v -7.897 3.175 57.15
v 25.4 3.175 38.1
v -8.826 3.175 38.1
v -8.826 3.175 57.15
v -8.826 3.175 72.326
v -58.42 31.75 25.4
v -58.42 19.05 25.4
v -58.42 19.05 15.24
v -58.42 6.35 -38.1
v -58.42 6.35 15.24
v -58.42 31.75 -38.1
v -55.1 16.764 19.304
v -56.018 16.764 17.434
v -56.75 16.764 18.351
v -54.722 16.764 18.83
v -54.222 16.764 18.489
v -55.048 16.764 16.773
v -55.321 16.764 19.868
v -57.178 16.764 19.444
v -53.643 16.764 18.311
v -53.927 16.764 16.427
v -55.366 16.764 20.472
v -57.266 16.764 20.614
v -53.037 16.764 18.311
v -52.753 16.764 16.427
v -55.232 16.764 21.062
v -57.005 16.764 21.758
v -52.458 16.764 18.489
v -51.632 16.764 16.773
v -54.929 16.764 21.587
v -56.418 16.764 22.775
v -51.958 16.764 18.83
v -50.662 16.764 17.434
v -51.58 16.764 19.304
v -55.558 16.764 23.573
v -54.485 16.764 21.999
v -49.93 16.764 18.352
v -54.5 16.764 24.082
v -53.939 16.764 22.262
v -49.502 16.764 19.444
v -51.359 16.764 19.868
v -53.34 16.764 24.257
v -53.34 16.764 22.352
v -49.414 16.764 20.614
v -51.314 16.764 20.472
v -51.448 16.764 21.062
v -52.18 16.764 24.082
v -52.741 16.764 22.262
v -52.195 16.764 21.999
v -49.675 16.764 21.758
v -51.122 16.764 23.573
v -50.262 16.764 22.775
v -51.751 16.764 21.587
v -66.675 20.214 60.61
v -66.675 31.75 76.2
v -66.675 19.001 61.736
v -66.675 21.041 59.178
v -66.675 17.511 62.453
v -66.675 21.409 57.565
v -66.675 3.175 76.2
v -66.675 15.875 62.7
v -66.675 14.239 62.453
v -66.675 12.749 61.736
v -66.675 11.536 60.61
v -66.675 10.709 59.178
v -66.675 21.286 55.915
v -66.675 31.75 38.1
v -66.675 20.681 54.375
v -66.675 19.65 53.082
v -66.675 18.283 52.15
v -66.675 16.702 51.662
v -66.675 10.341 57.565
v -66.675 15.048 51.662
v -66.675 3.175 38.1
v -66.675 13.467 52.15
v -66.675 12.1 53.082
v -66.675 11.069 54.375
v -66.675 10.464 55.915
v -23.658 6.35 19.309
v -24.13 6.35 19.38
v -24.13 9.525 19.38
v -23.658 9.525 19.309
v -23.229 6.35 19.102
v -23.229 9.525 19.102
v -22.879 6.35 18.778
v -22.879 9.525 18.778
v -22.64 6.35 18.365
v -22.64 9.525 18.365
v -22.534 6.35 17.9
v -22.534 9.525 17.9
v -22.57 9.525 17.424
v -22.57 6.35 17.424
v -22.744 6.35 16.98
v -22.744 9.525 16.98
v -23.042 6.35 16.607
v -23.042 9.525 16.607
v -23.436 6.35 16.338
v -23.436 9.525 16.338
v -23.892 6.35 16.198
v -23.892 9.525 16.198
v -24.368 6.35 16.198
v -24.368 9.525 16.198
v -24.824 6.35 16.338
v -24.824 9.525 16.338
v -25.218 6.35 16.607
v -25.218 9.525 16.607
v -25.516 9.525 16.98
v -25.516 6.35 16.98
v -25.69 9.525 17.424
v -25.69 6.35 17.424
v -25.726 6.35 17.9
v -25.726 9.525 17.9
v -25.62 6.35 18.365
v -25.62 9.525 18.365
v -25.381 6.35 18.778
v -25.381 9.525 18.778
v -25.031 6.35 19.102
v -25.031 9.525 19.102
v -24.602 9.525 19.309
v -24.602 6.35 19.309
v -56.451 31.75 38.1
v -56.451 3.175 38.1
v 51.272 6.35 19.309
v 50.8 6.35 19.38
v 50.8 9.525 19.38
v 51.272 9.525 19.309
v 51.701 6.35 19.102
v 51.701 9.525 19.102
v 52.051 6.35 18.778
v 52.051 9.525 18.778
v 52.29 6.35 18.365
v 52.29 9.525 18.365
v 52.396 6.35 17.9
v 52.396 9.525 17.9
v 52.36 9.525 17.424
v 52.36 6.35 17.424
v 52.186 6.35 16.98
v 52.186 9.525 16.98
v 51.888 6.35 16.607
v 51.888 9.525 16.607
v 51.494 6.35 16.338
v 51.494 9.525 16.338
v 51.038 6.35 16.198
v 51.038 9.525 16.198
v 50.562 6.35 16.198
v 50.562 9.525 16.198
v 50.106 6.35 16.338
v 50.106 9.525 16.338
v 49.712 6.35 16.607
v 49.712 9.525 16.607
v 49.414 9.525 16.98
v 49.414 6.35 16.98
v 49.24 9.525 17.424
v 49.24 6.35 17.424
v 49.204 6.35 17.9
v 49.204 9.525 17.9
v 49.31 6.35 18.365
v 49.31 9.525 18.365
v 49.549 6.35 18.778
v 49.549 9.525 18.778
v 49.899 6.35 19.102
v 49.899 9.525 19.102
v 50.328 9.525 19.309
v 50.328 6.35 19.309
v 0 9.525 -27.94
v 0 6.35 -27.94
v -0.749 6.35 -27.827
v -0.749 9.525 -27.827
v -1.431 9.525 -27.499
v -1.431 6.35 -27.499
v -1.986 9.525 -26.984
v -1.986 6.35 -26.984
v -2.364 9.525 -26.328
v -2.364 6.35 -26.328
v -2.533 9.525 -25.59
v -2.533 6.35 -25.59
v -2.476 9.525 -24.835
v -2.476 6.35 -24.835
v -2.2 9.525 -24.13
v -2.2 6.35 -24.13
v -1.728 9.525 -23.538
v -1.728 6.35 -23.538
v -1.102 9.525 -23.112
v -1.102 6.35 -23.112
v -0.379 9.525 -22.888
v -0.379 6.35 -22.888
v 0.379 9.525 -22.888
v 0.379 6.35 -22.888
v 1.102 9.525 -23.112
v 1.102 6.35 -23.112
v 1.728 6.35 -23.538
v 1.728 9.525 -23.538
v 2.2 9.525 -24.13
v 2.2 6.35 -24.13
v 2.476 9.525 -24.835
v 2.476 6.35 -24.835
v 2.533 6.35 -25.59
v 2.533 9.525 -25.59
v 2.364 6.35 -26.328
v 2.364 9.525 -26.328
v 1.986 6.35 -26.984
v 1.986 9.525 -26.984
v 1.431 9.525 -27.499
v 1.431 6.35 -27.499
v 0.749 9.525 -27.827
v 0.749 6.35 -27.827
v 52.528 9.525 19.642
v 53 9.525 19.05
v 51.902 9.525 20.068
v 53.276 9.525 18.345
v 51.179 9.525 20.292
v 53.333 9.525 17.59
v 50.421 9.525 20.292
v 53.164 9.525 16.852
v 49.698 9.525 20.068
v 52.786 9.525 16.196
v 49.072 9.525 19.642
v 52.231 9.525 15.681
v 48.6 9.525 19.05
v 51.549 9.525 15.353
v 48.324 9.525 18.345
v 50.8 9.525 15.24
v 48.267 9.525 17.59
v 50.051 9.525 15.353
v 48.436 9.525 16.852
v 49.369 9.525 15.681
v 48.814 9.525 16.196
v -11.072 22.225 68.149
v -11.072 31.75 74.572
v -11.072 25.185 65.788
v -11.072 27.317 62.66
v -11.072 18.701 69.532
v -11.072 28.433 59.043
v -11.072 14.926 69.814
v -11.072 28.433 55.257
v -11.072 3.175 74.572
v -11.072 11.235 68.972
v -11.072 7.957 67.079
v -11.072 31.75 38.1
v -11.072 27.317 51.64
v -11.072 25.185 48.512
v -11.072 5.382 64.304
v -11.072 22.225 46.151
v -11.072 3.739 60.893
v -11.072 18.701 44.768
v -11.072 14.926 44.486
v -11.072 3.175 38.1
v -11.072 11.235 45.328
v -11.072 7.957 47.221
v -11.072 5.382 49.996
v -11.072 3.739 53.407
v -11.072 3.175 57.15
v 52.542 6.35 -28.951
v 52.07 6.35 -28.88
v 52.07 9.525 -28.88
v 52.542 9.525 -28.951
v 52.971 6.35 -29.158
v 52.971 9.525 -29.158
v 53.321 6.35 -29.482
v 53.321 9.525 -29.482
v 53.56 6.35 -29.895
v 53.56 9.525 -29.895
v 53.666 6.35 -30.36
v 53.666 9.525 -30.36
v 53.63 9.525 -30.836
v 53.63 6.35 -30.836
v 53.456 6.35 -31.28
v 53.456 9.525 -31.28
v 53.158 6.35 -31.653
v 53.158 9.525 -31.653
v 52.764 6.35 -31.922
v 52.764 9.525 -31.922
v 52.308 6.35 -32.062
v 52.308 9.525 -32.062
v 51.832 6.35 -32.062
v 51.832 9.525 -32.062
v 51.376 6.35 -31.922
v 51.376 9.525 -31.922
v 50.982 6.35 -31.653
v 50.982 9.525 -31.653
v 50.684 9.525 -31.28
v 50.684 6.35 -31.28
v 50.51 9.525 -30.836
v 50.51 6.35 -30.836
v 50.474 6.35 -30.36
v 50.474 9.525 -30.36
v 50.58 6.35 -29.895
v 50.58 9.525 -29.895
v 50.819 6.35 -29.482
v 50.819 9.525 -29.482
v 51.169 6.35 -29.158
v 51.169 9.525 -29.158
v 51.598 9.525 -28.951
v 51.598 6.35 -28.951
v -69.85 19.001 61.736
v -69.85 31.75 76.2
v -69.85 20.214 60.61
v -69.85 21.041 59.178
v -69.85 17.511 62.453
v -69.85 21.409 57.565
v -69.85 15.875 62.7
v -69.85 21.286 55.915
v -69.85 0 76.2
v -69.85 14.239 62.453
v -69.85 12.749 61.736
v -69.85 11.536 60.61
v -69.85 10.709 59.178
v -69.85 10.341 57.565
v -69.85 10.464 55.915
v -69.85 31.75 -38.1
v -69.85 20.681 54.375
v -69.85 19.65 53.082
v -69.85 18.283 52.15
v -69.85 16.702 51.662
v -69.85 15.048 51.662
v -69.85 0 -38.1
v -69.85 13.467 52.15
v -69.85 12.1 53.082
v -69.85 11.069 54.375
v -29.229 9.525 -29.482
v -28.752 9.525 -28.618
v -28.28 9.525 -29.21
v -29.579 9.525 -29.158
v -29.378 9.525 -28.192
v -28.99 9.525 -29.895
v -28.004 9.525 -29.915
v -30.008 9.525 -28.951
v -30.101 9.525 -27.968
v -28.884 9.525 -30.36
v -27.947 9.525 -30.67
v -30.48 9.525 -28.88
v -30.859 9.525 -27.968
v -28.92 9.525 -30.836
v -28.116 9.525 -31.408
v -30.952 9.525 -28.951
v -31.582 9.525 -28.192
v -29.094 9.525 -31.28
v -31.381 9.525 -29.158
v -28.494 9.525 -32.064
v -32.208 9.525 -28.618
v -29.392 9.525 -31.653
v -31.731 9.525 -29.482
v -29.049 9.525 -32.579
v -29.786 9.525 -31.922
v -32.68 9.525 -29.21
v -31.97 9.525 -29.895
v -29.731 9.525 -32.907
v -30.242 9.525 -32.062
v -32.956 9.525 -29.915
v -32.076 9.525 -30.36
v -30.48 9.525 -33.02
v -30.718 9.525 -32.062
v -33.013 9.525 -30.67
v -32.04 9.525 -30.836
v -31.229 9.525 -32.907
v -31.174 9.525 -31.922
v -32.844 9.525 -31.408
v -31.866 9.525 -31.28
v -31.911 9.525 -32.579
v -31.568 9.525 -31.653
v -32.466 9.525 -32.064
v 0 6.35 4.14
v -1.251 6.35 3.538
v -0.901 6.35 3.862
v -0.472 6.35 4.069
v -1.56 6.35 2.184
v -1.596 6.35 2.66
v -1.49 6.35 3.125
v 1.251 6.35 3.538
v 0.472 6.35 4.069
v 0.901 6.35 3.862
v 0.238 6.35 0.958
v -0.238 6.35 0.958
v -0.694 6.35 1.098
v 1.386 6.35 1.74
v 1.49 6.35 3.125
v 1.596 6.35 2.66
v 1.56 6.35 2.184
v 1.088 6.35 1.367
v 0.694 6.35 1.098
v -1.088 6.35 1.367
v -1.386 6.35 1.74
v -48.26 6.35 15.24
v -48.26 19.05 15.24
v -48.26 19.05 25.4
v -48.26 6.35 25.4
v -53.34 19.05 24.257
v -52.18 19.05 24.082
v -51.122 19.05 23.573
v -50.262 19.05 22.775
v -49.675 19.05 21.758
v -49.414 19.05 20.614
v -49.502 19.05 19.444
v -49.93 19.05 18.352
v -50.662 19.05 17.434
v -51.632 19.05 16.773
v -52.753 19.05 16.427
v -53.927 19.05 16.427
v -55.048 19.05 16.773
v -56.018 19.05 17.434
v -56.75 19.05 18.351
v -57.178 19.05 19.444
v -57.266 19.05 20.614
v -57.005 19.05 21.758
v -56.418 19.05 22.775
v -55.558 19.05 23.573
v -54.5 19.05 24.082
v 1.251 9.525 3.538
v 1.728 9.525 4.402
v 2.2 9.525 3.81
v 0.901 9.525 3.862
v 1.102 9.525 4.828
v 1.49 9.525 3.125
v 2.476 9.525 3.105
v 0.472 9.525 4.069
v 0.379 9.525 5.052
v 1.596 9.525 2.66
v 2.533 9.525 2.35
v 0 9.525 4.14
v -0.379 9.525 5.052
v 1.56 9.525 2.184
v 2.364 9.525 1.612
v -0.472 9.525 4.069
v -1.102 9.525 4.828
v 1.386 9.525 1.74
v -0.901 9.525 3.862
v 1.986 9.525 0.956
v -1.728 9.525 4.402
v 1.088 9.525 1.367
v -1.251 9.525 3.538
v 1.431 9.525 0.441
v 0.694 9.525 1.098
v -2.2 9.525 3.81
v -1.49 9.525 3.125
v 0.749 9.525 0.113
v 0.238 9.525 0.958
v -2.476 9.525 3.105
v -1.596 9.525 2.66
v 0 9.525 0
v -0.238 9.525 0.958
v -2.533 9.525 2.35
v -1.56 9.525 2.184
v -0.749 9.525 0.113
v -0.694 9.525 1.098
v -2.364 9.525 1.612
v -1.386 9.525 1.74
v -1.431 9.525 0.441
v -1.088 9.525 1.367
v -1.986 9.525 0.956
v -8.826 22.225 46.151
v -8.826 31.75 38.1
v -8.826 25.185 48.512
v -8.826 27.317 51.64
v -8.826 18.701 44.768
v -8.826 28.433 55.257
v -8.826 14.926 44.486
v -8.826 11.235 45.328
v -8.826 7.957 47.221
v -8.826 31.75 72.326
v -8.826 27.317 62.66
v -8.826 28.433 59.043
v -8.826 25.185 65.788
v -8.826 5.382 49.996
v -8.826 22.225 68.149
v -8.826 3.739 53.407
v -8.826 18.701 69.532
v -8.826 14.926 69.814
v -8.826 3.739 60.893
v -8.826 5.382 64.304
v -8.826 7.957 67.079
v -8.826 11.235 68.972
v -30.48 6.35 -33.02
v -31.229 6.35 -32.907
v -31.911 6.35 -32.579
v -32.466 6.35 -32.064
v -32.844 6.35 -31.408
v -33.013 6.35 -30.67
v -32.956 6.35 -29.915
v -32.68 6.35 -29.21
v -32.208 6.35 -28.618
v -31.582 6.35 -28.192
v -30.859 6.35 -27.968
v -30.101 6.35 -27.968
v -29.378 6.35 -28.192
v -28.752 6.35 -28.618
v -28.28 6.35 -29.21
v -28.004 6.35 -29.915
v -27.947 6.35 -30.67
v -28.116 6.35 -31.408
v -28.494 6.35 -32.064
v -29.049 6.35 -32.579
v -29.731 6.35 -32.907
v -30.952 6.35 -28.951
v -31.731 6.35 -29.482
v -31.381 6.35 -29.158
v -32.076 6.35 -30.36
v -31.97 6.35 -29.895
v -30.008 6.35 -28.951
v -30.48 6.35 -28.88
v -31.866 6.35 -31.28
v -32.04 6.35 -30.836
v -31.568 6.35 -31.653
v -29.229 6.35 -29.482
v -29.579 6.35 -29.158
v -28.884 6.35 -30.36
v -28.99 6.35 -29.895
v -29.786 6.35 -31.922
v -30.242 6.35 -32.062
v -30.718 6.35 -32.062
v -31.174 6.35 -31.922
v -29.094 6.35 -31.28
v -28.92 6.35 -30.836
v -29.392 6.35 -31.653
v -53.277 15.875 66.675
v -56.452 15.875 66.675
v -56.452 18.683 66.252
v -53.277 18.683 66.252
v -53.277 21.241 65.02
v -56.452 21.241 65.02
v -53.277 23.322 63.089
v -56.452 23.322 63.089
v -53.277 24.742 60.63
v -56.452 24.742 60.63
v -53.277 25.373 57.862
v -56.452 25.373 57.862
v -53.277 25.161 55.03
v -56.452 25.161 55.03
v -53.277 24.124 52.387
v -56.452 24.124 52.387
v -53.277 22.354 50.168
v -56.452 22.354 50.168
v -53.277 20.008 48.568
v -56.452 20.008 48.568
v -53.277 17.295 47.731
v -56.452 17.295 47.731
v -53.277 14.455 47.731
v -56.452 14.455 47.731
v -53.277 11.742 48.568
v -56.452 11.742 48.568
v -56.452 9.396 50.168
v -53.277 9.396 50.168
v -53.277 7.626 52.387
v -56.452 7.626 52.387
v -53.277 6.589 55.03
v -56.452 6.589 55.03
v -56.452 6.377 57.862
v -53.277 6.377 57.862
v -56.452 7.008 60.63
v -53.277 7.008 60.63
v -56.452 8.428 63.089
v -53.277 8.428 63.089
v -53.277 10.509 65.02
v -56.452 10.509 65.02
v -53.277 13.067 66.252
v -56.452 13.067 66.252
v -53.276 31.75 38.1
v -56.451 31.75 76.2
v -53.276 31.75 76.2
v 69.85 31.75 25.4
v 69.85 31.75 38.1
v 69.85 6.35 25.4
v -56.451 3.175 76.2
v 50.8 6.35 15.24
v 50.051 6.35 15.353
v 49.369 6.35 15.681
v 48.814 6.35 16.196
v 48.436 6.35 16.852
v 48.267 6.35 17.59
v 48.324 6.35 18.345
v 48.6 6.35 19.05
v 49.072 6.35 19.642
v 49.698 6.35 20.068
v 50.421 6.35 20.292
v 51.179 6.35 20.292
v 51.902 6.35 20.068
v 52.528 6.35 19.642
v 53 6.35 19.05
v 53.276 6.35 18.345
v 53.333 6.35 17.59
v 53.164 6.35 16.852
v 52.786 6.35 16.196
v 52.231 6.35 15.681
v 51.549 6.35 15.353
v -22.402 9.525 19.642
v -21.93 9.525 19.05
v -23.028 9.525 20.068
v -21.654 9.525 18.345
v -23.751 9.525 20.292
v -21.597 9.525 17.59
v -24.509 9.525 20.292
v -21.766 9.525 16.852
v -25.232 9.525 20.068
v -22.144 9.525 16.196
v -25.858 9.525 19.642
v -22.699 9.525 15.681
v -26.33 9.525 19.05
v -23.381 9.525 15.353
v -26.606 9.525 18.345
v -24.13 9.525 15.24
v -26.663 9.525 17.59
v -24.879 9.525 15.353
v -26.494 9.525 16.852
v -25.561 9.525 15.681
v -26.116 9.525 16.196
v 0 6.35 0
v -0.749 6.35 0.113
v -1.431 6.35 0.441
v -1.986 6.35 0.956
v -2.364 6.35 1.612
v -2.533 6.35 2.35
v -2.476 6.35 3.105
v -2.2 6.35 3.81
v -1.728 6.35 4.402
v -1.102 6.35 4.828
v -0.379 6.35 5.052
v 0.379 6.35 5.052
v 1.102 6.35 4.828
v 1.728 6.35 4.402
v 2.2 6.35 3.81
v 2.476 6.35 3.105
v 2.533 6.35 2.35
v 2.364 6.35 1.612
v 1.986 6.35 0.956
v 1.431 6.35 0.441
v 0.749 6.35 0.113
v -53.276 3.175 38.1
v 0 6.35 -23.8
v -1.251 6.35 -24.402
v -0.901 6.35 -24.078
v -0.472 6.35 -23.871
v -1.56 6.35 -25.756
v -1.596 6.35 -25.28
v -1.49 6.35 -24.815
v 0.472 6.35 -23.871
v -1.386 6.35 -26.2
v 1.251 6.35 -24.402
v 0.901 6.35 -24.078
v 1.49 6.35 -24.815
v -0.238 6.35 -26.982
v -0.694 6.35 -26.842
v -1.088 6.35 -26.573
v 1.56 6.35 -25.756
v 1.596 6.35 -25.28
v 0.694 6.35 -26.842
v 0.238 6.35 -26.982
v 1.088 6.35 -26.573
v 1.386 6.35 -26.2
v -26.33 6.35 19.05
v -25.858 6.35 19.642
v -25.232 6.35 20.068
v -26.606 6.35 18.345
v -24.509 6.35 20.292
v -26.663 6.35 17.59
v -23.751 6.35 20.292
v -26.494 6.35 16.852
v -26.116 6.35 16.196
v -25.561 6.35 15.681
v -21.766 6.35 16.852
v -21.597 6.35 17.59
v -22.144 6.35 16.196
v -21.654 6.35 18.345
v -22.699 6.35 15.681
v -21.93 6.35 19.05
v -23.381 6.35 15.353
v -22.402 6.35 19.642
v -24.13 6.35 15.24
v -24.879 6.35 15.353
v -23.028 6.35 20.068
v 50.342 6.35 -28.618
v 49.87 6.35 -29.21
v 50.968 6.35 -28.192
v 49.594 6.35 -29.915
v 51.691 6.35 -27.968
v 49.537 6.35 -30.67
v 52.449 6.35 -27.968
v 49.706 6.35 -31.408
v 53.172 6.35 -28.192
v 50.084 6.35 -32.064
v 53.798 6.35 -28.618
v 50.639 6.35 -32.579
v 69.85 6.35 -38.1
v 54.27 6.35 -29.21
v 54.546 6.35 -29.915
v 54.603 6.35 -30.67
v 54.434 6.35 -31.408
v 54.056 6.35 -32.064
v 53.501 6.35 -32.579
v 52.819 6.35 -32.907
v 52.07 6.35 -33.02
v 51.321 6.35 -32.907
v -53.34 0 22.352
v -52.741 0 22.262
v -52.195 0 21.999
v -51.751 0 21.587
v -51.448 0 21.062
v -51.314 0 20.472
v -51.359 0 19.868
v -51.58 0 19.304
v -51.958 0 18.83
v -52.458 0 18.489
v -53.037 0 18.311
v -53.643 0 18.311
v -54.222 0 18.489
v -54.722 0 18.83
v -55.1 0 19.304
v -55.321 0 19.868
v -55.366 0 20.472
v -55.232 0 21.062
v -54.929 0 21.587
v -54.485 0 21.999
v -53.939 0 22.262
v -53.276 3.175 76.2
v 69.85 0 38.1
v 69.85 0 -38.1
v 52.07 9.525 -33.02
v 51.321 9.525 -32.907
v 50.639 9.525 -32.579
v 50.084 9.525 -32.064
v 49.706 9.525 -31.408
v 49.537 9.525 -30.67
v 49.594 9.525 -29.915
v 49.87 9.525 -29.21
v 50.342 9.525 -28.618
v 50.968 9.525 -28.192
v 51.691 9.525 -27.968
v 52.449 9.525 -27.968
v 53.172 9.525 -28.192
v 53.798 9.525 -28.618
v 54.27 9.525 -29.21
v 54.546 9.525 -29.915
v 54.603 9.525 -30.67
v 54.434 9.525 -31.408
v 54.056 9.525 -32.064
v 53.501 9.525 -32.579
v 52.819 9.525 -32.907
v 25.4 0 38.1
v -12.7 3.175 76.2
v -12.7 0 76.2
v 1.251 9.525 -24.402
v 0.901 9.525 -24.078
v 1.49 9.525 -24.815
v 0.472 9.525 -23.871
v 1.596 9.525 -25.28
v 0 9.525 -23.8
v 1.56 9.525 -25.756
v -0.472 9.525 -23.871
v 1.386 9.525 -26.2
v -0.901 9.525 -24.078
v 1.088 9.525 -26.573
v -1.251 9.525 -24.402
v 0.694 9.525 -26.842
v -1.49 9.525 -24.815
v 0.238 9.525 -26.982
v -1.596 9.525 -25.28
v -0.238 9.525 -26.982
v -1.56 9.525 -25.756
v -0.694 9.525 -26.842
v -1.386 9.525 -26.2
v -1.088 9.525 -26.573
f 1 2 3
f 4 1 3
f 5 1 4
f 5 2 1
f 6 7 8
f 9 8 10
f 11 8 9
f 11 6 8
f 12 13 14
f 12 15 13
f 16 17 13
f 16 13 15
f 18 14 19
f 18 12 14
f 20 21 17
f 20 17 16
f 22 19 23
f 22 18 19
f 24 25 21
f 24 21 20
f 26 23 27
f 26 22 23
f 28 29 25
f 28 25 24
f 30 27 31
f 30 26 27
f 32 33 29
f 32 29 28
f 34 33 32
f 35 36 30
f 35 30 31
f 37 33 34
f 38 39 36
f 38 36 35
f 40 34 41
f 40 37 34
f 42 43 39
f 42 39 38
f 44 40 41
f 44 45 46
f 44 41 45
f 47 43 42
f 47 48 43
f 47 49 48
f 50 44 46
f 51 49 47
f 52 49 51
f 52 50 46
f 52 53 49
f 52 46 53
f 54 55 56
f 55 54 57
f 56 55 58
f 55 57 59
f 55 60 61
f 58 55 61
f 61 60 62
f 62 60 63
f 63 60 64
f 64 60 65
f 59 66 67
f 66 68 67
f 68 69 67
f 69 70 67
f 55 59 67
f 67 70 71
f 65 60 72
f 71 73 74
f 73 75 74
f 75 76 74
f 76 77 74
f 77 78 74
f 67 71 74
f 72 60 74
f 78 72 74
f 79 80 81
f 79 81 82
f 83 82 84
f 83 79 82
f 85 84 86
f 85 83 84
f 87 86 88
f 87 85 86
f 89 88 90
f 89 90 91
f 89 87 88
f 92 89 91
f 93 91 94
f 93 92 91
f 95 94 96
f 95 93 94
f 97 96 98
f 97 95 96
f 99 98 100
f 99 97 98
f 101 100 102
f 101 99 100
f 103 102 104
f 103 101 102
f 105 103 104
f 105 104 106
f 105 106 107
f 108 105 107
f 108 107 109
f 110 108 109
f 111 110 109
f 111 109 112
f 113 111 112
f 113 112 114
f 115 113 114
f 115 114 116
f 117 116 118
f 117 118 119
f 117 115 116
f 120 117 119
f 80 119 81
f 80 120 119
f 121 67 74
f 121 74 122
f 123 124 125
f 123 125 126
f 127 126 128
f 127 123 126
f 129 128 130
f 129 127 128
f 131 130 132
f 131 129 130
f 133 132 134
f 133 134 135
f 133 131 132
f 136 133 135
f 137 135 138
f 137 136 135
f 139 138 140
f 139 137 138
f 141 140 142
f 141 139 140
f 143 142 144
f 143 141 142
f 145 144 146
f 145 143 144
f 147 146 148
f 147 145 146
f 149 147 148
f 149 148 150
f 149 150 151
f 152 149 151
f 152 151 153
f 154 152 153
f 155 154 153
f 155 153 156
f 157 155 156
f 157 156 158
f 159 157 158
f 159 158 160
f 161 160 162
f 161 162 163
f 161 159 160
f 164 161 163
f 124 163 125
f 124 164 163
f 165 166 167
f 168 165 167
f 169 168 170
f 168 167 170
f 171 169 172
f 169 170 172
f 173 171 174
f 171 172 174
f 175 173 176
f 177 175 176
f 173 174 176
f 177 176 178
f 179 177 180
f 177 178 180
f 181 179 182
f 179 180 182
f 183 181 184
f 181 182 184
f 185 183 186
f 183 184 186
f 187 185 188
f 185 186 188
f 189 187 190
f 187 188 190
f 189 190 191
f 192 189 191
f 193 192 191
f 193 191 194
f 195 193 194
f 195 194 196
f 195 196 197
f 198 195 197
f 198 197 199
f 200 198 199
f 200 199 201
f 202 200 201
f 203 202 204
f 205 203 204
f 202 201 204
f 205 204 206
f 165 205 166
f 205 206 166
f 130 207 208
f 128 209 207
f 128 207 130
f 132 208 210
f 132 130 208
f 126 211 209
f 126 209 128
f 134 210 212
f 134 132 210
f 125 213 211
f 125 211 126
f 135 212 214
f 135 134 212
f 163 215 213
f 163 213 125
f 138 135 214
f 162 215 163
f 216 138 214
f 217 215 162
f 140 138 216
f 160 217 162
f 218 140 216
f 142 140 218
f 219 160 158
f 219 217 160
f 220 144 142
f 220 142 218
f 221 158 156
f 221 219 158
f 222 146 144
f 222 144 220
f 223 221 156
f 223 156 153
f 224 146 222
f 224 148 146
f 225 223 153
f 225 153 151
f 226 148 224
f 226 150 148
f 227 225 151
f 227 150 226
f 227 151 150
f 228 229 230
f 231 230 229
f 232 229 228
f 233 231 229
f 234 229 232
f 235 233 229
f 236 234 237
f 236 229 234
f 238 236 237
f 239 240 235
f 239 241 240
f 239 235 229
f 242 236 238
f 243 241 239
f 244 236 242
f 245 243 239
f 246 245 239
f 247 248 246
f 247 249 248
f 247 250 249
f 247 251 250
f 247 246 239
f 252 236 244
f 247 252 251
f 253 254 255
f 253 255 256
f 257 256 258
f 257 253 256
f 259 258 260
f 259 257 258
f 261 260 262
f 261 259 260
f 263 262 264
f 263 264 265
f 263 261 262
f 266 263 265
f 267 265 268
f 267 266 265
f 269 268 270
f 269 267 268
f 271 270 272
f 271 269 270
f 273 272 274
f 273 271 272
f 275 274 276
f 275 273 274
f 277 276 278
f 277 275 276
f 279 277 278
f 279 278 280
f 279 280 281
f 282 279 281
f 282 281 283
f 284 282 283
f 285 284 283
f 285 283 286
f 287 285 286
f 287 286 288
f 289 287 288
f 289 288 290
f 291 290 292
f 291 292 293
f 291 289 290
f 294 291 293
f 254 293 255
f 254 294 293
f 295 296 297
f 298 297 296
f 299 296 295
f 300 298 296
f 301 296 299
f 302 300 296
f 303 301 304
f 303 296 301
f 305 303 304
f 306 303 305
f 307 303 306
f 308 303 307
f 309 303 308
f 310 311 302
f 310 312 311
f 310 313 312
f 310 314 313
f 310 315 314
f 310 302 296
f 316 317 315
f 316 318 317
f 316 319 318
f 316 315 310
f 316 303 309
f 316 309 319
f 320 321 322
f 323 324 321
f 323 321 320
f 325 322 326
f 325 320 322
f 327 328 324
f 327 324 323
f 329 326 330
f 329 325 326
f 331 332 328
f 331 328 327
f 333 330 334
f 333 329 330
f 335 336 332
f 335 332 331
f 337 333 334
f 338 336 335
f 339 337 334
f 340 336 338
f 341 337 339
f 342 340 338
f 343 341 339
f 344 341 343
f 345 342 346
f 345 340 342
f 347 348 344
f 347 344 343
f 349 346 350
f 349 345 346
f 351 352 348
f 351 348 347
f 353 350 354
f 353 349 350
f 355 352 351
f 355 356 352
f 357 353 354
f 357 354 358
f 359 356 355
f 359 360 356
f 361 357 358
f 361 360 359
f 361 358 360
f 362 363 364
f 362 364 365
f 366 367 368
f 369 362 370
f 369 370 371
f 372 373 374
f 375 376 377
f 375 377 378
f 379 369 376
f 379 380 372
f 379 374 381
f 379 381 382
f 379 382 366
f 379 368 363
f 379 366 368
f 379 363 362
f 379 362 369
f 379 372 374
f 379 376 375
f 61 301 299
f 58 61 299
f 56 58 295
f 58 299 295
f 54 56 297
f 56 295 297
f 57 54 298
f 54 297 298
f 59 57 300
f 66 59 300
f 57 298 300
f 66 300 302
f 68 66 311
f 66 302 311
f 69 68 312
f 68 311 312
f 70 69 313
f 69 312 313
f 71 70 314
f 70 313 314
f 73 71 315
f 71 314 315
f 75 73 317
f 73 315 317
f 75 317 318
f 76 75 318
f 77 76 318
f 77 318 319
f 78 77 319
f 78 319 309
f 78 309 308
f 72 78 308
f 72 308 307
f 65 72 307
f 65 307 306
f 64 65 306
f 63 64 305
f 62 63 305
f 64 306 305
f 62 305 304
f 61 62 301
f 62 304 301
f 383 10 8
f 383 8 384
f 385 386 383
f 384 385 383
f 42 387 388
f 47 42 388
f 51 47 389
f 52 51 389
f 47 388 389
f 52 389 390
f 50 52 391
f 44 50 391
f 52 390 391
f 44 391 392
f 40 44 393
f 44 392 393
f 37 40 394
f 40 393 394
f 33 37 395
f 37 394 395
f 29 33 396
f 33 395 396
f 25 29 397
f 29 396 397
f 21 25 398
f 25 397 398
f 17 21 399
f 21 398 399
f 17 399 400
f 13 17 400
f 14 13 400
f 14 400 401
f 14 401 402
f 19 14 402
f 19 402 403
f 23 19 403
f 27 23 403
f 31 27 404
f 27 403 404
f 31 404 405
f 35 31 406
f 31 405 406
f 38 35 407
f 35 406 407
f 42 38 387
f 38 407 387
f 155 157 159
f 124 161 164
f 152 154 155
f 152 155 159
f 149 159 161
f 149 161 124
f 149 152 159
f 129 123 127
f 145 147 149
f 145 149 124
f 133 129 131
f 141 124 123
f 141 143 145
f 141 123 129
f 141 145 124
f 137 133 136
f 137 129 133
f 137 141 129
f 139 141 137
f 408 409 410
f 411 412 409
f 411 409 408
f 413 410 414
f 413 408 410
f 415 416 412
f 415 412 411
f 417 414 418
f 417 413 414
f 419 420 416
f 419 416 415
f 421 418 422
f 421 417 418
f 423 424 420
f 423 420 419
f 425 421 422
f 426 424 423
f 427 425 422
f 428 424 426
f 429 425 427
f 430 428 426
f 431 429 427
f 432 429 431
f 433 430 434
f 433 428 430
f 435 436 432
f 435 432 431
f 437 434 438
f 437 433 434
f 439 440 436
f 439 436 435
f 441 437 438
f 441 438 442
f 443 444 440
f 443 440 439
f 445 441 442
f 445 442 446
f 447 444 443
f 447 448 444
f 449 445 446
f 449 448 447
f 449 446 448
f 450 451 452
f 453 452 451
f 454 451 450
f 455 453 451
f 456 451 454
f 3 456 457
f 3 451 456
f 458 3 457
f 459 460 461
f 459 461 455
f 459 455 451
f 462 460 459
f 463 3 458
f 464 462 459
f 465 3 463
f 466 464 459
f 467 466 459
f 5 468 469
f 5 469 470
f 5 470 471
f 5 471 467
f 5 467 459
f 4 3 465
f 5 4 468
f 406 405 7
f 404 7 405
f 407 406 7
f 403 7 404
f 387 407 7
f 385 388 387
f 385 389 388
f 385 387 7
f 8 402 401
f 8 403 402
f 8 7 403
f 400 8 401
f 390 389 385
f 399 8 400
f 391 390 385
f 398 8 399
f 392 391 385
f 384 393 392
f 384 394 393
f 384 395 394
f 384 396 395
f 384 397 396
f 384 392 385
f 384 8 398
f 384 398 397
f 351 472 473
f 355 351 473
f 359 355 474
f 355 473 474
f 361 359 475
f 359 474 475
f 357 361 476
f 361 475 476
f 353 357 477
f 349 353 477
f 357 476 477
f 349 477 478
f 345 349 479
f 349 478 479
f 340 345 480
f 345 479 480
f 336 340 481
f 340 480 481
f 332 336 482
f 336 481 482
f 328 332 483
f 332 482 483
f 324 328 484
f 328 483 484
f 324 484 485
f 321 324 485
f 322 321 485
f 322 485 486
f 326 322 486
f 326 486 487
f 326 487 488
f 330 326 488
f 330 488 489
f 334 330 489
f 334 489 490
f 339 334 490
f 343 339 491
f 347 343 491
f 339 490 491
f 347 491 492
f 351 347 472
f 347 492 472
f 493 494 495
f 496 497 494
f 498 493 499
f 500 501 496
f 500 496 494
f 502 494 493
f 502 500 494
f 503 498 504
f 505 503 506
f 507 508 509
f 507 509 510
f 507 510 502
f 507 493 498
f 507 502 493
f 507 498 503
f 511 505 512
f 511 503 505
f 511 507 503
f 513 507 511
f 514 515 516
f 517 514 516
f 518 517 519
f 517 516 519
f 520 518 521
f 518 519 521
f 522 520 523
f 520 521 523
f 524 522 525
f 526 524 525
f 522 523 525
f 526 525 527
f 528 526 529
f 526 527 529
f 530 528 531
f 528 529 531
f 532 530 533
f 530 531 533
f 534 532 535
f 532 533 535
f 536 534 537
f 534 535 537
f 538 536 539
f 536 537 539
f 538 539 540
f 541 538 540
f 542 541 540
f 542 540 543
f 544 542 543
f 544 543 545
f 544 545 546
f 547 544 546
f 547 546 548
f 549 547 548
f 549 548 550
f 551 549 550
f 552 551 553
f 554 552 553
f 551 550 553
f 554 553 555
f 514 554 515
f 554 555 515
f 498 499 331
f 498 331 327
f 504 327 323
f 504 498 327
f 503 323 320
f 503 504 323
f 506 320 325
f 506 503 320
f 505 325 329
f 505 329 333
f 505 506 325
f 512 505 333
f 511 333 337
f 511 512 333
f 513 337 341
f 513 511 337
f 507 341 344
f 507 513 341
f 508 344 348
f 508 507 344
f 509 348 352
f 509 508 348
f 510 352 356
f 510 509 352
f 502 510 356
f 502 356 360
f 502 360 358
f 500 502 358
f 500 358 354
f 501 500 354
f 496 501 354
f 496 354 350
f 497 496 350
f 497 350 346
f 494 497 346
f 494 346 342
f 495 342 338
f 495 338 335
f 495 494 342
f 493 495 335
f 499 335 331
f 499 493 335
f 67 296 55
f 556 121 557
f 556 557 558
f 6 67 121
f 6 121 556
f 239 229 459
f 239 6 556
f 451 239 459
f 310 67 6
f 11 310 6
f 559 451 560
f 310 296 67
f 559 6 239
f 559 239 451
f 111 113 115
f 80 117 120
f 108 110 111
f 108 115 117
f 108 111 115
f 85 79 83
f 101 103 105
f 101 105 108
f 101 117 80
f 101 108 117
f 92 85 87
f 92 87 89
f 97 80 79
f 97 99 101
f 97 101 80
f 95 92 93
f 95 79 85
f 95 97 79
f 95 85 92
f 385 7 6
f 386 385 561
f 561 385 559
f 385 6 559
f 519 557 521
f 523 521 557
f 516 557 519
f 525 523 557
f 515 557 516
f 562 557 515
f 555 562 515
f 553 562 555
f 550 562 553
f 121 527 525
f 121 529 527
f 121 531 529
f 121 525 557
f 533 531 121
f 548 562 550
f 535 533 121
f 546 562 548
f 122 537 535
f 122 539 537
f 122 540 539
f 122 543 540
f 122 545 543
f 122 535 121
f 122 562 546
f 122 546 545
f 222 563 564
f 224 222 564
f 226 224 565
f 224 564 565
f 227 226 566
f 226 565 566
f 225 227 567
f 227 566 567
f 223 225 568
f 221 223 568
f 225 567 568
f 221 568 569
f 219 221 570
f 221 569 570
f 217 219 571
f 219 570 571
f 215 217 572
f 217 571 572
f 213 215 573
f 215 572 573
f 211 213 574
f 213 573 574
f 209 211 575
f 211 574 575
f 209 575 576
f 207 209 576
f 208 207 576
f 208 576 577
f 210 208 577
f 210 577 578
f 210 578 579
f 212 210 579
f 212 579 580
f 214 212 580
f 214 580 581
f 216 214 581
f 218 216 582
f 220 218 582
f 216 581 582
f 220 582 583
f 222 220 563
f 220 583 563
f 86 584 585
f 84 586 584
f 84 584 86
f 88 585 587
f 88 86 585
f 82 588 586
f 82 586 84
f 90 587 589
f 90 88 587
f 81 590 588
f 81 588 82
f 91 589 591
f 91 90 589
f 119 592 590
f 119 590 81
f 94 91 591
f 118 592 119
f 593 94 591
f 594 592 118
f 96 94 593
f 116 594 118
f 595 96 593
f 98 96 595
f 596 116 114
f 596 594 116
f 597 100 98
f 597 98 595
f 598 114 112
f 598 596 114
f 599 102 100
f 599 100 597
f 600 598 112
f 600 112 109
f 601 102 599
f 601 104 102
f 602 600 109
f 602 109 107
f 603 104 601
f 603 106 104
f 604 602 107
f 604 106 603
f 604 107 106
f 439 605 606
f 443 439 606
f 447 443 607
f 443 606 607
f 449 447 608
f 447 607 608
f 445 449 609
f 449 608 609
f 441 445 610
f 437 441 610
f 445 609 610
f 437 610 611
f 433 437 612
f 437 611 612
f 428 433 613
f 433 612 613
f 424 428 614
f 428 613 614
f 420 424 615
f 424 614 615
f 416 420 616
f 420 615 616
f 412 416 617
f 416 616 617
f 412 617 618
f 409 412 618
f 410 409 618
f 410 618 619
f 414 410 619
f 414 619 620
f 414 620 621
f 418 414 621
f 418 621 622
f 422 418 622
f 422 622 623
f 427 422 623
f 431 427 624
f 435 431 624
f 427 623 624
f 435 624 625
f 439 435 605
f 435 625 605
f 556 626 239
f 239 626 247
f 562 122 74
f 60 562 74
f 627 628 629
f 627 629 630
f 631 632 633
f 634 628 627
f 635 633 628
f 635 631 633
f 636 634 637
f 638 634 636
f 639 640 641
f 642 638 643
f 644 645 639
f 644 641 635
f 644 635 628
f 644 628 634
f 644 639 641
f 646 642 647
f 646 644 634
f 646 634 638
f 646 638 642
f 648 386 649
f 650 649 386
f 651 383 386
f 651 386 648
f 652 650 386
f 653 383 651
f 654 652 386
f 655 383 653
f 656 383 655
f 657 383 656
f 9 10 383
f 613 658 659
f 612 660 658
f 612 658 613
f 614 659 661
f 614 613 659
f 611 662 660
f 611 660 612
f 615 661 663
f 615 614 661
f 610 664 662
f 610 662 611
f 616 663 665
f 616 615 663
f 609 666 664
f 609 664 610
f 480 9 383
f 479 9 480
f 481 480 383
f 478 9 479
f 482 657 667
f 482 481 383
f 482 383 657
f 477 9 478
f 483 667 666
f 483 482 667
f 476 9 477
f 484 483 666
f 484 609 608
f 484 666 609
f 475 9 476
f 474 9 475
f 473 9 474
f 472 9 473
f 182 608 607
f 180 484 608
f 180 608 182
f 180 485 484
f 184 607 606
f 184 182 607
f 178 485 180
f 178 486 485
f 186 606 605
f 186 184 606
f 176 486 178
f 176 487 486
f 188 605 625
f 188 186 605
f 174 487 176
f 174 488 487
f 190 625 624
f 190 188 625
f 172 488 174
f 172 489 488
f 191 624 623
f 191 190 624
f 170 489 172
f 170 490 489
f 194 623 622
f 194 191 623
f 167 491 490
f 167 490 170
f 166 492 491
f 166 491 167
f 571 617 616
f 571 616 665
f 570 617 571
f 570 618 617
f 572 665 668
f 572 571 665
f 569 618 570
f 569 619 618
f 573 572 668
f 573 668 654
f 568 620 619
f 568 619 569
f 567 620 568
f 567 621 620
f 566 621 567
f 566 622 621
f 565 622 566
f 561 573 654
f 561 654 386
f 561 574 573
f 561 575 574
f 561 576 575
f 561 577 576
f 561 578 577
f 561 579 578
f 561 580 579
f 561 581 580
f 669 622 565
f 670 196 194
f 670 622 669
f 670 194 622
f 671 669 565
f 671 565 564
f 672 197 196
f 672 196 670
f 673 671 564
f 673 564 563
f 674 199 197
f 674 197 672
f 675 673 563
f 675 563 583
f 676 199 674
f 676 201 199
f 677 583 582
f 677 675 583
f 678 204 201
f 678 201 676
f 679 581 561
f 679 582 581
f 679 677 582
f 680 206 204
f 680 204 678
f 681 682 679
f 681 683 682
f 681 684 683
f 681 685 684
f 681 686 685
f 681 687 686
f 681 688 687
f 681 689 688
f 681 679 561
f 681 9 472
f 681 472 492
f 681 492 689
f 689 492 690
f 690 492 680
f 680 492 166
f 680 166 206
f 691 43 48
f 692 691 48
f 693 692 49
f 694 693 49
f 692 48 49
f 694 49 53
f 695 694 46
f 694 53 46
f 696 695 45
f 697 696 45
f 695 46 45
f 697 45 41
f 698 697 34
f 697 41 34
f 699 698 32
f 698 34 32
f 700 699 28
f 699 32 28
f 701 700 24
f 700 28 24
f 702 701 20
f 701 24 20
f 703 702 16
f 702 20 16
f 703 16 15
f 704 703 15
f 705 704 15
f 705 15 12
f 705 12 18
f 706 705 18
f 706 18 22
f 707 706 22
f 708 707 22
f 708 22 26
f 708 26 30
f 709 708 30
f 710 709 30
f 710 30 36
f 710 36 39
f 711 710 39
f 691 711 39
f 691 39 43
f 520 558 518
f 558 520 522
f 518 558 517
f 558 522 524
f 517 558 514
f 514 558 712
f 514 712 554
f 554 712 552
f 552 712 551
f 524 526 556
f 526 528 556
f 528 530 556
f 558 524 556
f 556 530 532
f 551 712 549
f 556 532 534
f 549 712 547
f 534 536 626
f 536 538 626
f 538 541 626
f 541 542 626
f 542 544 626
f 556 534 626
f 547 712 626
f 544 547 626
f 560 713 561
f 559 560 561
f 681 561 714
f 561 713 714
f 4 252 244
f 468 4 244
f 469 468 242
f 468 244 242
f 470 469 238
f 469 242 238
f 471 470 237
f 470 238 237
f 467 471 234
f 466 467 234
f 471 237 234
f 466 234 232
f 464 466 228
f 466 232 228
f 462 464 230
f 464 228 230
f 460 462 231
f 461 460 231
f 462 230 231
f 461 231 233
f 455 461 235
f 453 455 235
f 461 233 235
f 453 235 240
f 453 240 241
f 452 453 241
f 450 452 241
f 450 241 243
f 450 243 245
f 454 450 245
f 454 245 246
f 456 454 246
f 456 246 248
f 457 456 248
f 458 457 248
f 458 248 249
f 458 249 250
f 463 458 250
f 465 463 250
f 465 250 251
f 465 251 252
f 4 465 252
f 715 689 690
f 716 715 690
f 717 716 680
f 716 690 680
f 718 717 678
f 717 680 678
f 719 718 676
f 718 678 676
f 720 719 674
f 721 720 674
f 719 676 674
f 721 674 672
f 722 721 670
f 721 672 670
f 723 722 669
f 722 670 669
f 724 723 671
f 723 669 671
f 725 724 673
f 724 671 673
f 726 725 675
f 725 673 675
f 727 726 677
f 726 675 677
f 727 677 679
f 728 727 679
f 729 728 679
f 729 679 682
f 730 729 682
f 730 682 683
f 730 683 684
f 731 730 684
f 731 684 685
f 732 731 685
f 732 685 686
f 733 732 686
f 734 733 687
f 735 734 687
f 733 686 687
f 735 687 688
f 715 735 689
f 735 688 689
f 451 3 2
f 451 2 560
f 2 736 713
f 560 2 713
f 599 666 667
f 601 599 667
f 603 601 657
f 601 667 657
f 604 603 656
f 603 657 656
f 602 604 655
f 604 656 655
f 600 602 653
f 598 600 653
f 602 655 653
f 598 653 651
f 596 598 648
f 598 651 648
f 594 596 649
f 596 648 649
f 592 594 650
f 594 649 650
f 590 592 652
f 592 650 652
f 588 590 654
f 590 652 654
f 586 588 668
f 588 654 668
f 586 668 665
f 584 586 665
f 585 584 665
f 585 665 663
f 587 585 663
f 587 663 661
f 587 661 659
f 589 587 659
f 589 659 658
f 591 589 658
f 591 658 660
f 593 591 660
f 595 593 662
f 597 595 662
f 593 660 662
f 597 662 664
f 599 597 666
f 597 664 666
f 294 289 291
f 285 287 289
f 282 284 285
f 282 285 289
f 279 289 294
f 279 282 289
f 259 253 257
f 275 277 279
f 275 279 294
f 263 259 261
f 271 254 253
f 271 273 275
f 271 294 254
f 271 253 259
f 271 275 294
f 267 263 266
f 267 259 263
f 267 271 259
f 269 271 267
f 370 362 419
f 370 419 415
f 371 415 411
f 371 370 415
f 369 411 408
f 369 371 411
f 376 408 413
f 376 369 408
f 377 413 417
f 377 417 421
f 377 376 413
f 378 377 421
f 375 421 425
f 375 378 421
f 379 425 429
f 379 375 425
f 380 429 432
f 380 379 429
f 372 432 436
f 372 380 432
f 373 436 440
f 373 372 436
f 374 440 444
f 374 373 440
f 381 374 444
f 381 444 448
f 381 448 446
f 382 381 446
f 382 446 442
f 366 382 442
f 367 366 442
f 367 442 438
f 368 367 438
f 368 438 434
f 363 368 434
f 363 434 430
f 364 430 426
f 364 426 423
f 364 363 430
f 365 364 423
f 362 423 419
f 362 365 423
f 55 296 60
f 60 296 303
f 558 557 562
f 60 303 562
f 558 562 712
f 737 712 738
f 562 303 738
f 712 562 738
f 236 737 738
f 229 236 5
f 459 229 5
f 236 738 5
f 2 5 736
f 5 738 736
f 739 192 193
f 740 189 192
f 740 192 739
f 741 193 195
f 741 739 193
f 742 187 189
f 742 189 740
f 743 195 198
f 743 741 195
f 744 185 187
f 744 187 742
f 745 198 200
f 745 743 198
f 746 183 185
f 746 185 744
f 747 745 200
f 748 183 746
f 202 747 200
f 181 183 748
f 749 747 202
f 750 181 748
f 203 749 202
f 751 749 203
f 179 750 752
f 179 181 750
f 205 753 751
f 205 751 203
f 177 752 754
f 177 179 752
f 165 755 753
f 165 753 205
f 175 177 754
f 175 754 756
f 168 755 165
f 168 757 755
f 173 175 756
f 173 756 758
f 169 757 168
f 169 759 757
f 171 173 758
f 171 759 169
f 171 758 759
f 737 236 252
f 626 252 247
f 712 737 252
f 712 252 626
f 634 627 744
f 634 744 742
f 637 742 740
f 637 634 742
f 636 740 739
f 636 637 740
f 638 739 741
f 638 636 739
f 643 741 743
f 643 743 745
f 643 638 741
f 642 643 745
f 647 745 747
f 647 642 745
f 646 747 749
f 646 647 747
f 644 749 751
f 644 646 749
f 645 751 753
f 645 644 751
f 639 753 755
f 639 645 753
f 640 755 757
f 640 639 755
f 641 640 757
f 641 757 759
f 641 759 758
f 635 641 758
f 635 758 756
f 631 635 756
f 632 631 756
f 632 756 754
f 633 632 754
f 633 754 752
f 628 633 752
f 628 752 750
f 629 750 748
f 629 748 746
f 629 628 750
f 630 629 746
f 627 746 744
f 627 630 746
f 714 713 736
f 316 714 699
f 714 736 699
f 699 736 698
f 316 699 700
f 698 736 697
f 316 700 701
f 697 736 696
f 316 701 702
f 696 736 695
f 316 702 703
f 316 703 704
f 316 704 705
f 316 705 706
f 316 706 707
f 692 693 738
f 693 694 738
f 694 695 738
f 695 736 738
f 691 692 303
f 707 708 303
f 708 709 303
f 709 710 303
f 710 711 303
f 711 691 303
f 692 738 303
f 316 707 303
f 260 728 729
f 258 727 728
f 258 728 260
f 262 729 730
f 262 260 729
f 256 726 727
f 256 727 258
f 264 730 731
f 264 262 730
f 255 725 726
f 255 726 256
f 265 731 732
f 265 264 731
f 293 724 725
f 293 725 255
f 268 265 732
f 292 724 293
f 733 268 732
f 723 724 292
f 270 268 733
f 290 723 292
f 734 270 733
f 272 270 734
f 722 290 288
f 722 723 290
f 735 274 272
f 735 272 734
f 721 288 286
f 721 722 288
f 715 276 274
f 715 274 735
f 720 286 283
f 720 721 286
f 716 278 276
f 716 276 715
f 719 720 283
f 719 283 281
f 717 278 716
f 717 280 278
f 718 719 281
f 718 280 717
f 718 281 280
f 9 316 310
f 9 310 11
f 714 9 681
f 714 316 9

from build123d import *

# Parameters (mm, degrees)
SKETCH1_W           = 139.7
SKETCH1_H           = 76.2
BOSS_EXTRUDE1_DEPTH = 31.75
SKETCH2_W           = 128.27
SKETCH2_H           = 63.545947231
CUT_EXTRUDE1_DEPTH  = 25.4
SKETCH3_W           = 10.16
SKETCH3_H           = 10.16
BOSS_EXTRUDE3_DEPTH = 12.7
SKETCH4_R           = 2.032
CUT_EXTRUDE2_DEPTH  = 82.814026915
SKETCH5_R           = 3.937
CUT_EXTRUDE3_DEPTH  = 2.286
SKETCH7_R           = 2.54
SKETCH7_R_2         = 1.6002
BOSS_EXTRUDE5_DEPTH = 3.175
BOSS_EXTRUDE6_DEPTH = 3.175
SKETCH9_W           = 3.175
SKETCH9_H           = 38.1
BOSS_EXTRUDE7_DEPTH = 28.575
SKETCH10_R          = 5.5499
CUT_EXTRUDE4_DEPTH  = 3.175
SKETCH11_R          = 9.525
CUT_EXTRUDE5_DEPTH  = 3.175
SKETCH12_R          = 12.7
CUT_EXTRUDE6_DEPTH  = 3.175


with BuildPart() as part:
    # Sketch1 → Boss-Extrude1 (new body)
    with BuildSketch(Plane(origin=(0, 0, 0), x_dir=(1, 0, 0), z_dir=(0, 1, 0))):
        Rectangle(SKETCH1_W, SKETCH1_H)
    extrude(amount=BOSS_EXTRUDE1_DEPTH)

    # Sketch2 → Cut-Extrude1 (cut)
    with BuildSketch(Plane(origin=(0, 31.75, 0), x_dir=(1, 0, 0), z_dir=(0, 1, 0))):
        with Locations((5.715, 6.372973615)):
            Rectangle(SKETCH2_W, SKETCH2_H)
    extrude(amount=-CUT_EXTRUDE1_DEPTH, mode=Mode.SUBTRACT)

    # Sketch3 → Boss-Extrude3 (add)
    with BuildSketch(Plane(origin=(0, 6.35, 0), x_dir=(1, 0, 0), z_dir=(0, 1, 0))):
        with Locations((-53.34, -20.32)):
            Rectangle(SKETCH3_W, SKETCH3_H)
    extrude(amount=BOSS_EXTRUDE3_DEPTH)

    # Sketch4 → Cut-Extrude2 (cut, through all)
    with BuildSketch(Plane(origin=(0, 19.05, 0), x_dir=(1, 0, 0), z_dir=(0, 1, 0))):
        with Locations(Location((-53.34, -20.32, 0), (0, 0, 270))):
            Circle(SKETCH4_R)
    extrude(amount=-CUT_EXTRUDE2_DEPTH, mode=Mode.SUBTRACT)

    # Sketch5 → Cut-Extrude3 (cut)
    with BuildSketch(Plane(origin=(0, 19.05, 0), x_dir=(1, 0, 0), z_dir=(0, 1, 0))):
        with Locations(Location((-53.34, -20.32, 0), (0, 0, 270))):
            Circle(SKETCH5_R)
    extrude(amount=-CUT_EXTRUDE3_DEPTH, mode=Mode.SUBTRACT)

    # Sketch7 → Boss-Extrude5 (add)
    # profile 1 of 6: a face of its own
    with BuildSketch(Plane(origin=(0, 6.35, 0), x_dir=(1, 0, 0), z_dir=(0, 1, 0))):
        with Locations(Location((-30.48, 30.48, 0), (0, 0, 90))):
            Circle(SKETCH7_R)
        with Locations(Location((-30.48, 30.48, 0), (0, 0, 270))):
            Circle(SKETCH7_R_2, mode=Mode.SUBTRACT)
    # profile 2 of 6: a face of its own
    with BuildSketch(Plane(origin=(0, 6.35, 0), x_dir=(1, 0, 0), z_dir=(0, 1, 0))):
        with Locations(Location((-24.13, -17.78, 0), (0, 0, 90))):
            Circle(SKETCH7_R)
        with Locations(Location((-24.13, -17.78, 0), (0, 0, 270))):
            Circle(SKETCH7_R_2, mode=Mode.SUBTRACT)
    # profile 3 of 6: a face of its own
    with BuildSketch(Plane(origin=(0, 6.35, 0), x_dir=(1, 0, 0), z_dir=(0, 1, 0))):
        with Locations(Location((0, 25.4, 0), (0, 0, 90))):
            Circle(SKETCH7_R)
        with Locations(Location((0, 25.4, 0), (0, 0, 270))):
            Circle(SKETCH7_R_2, mode=Mode.SUBTRACT)
    # profile 4 of 6: a face of its own
    with BuildSketch(Plane(origin=(0, 6.35, 0), x_dir=(1, 0, 0), z_dir=(0, 1, 0))):
        with Locations(Location((0, -2.54, 0), (0, 0, 90))):
            Circle(SKETCH7_R)
        with Locations(Location((0, -2.54, 0), (0, 0, 270))):
            Circle(SKETCH7_R_2, mode=Mode.SUBTRACT)
    # profile 5 of 6: a face of its own
    with BuildSketch(Plane(origin=(0, 6.35, 0), x_dir=(1, 0, 0), z_dir=(0, 1, 0))):
        with Locations(Location((50.8, -17.78, 0), (0, 0, 90))):
            Circle(SKETCH7_R)
        with Locations(Location((50.8, -17.78, 0), (0, 0, 270))):
            Circle(SKETCH7_R_2, mode=Mode.SUBTRACT)
    # profile 6 of 6: a face of its own
    with BuildSketch(Plane(origin=(0, 6.35, 0), x_dir=(1, 0, 0), z_dir=(0, 1, 0))):
        with Locations(Location((52.07, 30.48, 0), (0, 0, 90))):
            Circle(SKETCH7_R)
        with Locations(Location((52.07, 30.48, 0), (0, 0, 270))):
            Circle(SKETCH7_R_2, mode=Mode.SUBTRACT)
    extrude(amount=BOSS_EXTRUDE5_DEPTH)

    # Sketch8 → Boss-Extrude6 (add)
    with BuildSketch(Plane.XZ):
        Polygon((-69.85, 38.1), (-69.85, 76.2), (-12.7, 76.2), (25.4, 38.1), align=None)
    extrude(amount=-BOSS_EXTRUDE6_DEPTH)

    # Sketch9 → Boss-Extrude7 (add)
    with BuildSketch(Plane(origin=(0, 3.175, 0), x_dir=(1, 0, 0), z_dir=(0, 1, 0))):
        with Locations((-68.2625, -57.15)):
            Rectangle(SKETCH9_W, SKETCH9_H)
        Polygon((-8.8265, -72.3265), (-11.07156403, -74.57156403), (-11.07156403, -38.1), (-8.8265, -38.1), align=None)
        with Locations((-54.864, -57.15)):
            Rectangle(SKETCH9_W, SKETCH9_H)
    extrude(amount=BOSS_EXTRUDE7_DEPTH)

    # Sketch10 → Cut-Extrude4 (cut)
    with BuildSketch(Plane.ZY.offset(69.85)):
        with Locations((57.15, 15.875)):
            Circle(SKETCH10_R)
    extrude(amount=-CUT_EXTRUDE4_DEPTH, mode=Mode.SUBTRACT)

    # Sketch11 → Cut-Extrude5 (cut)
    with BuildSketch(Plane.ZY.offset(56.4515)):
        with Locations((57.15, 15.875)):
            Circle(SKETCH11_R)
    extrude(amount=-CUT_EXTRUDE5_DEPTH, mode=Mode.SUBTRACT)

    # Sketch12 → Cut-Extrude6 (cut)
    with BuildSketch(Plane.ZY.offset(11.07156403)):
        with Locations(Location((57.15, 15.875, 0), (0, 0, 270))):
            Circle(SKETCH12_R)
    extrude(amount=-CUT_EXTRUDE6_DEPTH, mode=Mode.SUBTRACT)


solid = part.part
